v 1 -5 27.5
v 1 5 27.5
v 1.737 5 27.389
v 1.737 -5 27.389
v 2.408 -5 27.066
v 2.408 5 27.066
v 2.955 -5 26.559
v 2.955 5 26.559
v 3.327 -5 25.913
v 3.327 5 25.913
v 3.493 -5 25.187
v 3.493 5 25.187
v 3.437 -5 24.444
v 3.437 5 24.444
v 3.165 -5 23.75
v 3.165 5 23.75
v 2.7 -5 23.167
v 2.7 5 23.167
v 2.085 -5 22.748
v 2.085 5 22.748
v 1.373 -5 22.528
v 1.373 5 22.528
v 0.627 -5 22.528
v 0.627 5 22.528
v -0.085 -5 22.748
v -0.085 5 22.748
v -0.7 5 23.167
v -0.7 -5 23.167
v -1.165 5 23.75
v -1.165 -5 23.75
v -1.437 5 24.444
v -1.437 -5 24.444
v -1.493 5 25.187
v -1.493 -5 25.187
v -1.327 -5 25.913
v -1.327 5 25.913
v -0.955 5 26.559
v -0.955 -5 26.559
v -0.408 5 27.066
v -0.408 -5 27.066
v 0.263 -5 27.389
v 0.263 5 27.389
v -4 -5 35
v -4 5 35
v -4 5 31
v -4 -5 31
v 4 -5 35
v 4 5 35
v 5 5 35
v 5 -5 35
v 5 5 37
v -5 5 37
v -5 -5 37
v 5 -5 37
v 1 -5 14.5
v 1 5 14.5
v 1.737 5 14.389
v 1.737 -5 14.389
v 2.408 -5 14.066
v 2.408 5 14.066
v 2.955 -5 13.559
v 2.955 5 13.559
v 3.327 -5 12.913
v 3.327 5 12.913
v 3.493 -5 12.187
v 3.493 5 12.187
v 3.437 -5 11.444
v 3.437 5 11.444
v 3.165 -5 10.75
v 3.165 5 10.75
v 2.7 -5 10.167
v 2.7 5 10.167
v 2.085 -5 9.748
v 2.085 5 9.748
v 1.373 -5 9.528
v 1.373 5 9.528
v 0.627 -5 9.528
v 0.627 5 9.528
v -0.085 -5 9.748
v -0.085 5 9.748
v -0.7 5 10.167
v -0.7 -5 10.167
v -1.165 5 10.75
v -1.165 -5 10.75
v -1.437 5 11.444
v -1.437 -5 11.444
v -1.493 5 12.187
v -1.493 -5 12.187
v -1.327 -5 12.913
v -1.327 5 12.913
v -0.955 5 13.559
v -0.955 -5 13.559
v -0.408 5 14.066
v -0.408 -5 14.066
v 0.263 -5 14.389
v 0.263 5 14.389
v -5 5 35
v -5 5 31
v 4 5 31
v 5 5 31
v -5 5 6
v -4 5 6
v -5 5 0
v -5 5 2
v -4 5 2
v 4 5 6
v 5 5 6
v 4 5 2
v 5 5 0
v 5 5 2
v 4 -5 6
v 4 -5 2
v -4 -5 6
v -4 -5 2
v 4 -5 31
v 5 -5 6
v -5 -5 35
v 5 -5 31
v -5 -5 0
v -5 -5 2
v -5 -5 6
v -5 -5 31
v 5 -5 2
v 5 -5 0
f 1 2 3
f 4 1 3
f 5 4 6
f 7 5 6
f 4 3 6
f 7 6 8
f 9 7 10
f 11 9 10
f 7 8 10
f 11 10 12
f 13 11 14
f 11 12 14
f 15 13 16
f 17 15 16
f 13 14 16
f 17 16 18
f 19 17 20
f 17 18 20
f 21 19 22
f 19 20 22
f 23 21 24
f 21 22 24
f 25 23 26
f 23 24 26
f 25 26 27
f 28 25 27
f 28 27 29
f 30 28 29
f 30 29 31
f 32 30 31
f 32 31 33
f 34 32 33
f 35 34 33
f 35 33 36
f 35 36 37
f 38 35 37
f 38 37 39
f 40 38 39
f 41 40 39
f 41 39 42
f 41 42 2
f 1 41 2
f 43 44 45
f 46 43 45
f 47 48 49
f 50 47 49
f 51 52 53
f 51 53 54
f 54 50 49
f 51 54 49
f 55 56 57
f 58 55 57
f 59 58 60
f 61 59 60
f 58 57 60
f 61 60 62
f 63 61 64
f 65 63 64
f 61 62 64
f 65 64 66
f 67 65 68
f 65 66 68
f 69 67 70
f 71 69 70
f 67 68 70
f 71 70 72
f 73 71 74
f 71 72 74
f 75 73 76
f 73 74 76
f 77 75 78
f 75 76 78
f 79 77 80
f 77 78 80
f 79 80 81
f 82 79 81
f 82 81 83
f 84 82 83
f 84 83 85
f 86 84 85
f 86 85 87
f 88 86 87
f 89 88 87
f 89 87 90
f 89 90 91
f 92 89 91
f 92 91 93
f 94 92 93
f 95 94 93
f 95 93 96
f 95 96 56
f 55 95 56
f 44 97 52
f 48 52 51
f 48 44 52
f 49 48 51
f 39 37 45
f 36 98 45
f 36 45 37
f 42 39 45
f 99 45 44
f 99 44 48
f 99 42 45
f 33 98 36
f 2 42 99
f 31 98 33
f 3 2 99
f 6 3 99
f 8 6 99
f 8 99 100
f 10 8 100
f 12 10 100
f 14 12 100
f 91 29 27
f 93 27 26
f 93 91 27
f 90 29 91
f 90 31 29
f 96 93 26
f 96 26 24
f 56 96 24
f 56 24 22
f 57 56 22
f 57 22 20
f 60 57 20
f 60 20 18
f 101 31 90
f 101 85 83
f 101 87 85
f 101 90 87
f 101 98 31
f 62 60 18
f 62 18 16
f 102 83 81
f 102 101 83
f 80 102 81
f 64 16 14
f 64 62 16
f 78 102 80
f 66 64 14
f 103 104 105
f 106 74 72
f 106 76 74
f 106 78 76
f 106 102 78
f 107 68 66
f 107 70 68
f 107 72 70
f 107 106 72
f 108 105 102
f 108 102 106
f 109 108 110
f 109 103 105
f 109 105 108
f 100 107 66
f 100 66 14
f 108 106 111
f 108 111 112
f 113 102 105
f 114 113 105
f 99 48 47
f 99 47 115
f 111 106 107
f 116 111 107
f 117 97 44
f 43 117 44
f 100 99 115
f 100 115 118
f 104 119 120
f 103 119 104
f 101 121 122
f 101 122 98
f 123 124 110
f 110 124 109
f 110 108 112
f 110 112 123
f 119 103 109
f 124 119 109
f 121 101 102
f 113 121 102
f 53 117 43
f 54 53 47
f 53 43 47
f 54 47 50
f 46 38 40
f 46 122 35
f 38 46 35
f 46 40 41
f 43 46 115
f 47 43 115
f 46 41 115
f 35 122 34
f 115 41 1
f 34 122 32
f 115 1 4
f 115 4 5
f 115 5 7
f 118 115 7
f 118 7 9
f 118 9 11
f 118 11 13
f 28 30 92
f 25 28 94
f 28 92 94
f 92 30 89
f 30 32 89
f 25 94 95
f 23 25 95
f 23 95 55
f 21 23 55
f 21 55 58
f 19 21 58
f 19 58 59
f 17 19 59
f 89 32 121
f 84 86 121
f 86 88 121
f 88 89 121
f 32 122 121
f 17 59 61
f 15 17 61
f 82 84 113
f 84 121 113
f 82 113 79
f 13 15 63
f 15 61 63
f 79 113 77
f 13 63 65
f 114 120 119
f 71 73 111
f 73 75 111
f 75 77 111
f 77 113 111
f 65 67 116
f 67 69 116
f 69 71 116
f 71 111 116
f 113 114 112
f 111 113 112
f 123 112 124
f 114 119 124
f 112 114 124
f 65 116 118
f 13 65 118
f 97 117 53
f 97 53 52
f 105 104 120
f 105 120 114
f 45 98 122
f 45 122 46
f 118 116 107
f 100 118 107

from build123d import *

# Parameters (mm, degrees)
CROQUIS1_W              = 10
CROQUIS1_H              = 10
SALIENTE_EXTRUIR1_DEPTH = 37
CROQUIS2_R              = 2.5
CORTAR_EXTRUIR1_DEPTH   = 39.65229618
CROQUIS4_W              = 1
CROQUIS4_H              = 4
CORTAR_EXTRUIR2_DEPTH   = 39.65229618


with BuildPart() as part:
    # Croquis1 → Saliente-Extruir1 (new body)
    with BuildSketch(Plane.XY):
        Rectangle(CROQUIS1_W, CROQUIS1_H)
    extrude(amount=SALIENTE_EXTRUIR1_DEPTH)

    # Croquis2 → Cortar-Extruir1 (cut, through all)
    with BuildSketch(Plane(origin=(0, 5, 0), x_dir=(1, 0, 0), z_dir=(0, 1, 0))):
        with Locations(Location((1, -12, 0), (0, 0, 270))):
            Circle(CROQUIS2_R)
        with Locations(Location((1, -25, 0), (0, 0, 270))):
            Circle(CROQUIS2_R)
    extrude(amount=-CORTAR_EXTRUIR1_DEPTH, mode=Mode.SUBTRACT)

    # Croquis4 → Cortar-Extruir2 (cut, through all)
    with BuildSketch(Plane(origin=(0, 5, 0), x_dir=(1, 0, 0), z_dir=(0, 1, 0))):
        with Locations((-4.5, -33)):
            Rectangle(CROQUIS4_W, CROQUIS4_H)
        with Locations((4.5, -33)):
            Rectangle(CROQUIS4_W, CROQUIS4_H)
        with Locations((4.5, -4)):
            Rectangle(CROQUIS4_W, CROQUIS4_H)
        with Locations((-4.5, -4)):
            Rectangle(CROQUIS4_W, CROQUIS4_H)
    extrude(amount=-CORTAR_EXTRUIR2_DEPTH, mode=Mode.SUBTRACT)


solid = part.part
